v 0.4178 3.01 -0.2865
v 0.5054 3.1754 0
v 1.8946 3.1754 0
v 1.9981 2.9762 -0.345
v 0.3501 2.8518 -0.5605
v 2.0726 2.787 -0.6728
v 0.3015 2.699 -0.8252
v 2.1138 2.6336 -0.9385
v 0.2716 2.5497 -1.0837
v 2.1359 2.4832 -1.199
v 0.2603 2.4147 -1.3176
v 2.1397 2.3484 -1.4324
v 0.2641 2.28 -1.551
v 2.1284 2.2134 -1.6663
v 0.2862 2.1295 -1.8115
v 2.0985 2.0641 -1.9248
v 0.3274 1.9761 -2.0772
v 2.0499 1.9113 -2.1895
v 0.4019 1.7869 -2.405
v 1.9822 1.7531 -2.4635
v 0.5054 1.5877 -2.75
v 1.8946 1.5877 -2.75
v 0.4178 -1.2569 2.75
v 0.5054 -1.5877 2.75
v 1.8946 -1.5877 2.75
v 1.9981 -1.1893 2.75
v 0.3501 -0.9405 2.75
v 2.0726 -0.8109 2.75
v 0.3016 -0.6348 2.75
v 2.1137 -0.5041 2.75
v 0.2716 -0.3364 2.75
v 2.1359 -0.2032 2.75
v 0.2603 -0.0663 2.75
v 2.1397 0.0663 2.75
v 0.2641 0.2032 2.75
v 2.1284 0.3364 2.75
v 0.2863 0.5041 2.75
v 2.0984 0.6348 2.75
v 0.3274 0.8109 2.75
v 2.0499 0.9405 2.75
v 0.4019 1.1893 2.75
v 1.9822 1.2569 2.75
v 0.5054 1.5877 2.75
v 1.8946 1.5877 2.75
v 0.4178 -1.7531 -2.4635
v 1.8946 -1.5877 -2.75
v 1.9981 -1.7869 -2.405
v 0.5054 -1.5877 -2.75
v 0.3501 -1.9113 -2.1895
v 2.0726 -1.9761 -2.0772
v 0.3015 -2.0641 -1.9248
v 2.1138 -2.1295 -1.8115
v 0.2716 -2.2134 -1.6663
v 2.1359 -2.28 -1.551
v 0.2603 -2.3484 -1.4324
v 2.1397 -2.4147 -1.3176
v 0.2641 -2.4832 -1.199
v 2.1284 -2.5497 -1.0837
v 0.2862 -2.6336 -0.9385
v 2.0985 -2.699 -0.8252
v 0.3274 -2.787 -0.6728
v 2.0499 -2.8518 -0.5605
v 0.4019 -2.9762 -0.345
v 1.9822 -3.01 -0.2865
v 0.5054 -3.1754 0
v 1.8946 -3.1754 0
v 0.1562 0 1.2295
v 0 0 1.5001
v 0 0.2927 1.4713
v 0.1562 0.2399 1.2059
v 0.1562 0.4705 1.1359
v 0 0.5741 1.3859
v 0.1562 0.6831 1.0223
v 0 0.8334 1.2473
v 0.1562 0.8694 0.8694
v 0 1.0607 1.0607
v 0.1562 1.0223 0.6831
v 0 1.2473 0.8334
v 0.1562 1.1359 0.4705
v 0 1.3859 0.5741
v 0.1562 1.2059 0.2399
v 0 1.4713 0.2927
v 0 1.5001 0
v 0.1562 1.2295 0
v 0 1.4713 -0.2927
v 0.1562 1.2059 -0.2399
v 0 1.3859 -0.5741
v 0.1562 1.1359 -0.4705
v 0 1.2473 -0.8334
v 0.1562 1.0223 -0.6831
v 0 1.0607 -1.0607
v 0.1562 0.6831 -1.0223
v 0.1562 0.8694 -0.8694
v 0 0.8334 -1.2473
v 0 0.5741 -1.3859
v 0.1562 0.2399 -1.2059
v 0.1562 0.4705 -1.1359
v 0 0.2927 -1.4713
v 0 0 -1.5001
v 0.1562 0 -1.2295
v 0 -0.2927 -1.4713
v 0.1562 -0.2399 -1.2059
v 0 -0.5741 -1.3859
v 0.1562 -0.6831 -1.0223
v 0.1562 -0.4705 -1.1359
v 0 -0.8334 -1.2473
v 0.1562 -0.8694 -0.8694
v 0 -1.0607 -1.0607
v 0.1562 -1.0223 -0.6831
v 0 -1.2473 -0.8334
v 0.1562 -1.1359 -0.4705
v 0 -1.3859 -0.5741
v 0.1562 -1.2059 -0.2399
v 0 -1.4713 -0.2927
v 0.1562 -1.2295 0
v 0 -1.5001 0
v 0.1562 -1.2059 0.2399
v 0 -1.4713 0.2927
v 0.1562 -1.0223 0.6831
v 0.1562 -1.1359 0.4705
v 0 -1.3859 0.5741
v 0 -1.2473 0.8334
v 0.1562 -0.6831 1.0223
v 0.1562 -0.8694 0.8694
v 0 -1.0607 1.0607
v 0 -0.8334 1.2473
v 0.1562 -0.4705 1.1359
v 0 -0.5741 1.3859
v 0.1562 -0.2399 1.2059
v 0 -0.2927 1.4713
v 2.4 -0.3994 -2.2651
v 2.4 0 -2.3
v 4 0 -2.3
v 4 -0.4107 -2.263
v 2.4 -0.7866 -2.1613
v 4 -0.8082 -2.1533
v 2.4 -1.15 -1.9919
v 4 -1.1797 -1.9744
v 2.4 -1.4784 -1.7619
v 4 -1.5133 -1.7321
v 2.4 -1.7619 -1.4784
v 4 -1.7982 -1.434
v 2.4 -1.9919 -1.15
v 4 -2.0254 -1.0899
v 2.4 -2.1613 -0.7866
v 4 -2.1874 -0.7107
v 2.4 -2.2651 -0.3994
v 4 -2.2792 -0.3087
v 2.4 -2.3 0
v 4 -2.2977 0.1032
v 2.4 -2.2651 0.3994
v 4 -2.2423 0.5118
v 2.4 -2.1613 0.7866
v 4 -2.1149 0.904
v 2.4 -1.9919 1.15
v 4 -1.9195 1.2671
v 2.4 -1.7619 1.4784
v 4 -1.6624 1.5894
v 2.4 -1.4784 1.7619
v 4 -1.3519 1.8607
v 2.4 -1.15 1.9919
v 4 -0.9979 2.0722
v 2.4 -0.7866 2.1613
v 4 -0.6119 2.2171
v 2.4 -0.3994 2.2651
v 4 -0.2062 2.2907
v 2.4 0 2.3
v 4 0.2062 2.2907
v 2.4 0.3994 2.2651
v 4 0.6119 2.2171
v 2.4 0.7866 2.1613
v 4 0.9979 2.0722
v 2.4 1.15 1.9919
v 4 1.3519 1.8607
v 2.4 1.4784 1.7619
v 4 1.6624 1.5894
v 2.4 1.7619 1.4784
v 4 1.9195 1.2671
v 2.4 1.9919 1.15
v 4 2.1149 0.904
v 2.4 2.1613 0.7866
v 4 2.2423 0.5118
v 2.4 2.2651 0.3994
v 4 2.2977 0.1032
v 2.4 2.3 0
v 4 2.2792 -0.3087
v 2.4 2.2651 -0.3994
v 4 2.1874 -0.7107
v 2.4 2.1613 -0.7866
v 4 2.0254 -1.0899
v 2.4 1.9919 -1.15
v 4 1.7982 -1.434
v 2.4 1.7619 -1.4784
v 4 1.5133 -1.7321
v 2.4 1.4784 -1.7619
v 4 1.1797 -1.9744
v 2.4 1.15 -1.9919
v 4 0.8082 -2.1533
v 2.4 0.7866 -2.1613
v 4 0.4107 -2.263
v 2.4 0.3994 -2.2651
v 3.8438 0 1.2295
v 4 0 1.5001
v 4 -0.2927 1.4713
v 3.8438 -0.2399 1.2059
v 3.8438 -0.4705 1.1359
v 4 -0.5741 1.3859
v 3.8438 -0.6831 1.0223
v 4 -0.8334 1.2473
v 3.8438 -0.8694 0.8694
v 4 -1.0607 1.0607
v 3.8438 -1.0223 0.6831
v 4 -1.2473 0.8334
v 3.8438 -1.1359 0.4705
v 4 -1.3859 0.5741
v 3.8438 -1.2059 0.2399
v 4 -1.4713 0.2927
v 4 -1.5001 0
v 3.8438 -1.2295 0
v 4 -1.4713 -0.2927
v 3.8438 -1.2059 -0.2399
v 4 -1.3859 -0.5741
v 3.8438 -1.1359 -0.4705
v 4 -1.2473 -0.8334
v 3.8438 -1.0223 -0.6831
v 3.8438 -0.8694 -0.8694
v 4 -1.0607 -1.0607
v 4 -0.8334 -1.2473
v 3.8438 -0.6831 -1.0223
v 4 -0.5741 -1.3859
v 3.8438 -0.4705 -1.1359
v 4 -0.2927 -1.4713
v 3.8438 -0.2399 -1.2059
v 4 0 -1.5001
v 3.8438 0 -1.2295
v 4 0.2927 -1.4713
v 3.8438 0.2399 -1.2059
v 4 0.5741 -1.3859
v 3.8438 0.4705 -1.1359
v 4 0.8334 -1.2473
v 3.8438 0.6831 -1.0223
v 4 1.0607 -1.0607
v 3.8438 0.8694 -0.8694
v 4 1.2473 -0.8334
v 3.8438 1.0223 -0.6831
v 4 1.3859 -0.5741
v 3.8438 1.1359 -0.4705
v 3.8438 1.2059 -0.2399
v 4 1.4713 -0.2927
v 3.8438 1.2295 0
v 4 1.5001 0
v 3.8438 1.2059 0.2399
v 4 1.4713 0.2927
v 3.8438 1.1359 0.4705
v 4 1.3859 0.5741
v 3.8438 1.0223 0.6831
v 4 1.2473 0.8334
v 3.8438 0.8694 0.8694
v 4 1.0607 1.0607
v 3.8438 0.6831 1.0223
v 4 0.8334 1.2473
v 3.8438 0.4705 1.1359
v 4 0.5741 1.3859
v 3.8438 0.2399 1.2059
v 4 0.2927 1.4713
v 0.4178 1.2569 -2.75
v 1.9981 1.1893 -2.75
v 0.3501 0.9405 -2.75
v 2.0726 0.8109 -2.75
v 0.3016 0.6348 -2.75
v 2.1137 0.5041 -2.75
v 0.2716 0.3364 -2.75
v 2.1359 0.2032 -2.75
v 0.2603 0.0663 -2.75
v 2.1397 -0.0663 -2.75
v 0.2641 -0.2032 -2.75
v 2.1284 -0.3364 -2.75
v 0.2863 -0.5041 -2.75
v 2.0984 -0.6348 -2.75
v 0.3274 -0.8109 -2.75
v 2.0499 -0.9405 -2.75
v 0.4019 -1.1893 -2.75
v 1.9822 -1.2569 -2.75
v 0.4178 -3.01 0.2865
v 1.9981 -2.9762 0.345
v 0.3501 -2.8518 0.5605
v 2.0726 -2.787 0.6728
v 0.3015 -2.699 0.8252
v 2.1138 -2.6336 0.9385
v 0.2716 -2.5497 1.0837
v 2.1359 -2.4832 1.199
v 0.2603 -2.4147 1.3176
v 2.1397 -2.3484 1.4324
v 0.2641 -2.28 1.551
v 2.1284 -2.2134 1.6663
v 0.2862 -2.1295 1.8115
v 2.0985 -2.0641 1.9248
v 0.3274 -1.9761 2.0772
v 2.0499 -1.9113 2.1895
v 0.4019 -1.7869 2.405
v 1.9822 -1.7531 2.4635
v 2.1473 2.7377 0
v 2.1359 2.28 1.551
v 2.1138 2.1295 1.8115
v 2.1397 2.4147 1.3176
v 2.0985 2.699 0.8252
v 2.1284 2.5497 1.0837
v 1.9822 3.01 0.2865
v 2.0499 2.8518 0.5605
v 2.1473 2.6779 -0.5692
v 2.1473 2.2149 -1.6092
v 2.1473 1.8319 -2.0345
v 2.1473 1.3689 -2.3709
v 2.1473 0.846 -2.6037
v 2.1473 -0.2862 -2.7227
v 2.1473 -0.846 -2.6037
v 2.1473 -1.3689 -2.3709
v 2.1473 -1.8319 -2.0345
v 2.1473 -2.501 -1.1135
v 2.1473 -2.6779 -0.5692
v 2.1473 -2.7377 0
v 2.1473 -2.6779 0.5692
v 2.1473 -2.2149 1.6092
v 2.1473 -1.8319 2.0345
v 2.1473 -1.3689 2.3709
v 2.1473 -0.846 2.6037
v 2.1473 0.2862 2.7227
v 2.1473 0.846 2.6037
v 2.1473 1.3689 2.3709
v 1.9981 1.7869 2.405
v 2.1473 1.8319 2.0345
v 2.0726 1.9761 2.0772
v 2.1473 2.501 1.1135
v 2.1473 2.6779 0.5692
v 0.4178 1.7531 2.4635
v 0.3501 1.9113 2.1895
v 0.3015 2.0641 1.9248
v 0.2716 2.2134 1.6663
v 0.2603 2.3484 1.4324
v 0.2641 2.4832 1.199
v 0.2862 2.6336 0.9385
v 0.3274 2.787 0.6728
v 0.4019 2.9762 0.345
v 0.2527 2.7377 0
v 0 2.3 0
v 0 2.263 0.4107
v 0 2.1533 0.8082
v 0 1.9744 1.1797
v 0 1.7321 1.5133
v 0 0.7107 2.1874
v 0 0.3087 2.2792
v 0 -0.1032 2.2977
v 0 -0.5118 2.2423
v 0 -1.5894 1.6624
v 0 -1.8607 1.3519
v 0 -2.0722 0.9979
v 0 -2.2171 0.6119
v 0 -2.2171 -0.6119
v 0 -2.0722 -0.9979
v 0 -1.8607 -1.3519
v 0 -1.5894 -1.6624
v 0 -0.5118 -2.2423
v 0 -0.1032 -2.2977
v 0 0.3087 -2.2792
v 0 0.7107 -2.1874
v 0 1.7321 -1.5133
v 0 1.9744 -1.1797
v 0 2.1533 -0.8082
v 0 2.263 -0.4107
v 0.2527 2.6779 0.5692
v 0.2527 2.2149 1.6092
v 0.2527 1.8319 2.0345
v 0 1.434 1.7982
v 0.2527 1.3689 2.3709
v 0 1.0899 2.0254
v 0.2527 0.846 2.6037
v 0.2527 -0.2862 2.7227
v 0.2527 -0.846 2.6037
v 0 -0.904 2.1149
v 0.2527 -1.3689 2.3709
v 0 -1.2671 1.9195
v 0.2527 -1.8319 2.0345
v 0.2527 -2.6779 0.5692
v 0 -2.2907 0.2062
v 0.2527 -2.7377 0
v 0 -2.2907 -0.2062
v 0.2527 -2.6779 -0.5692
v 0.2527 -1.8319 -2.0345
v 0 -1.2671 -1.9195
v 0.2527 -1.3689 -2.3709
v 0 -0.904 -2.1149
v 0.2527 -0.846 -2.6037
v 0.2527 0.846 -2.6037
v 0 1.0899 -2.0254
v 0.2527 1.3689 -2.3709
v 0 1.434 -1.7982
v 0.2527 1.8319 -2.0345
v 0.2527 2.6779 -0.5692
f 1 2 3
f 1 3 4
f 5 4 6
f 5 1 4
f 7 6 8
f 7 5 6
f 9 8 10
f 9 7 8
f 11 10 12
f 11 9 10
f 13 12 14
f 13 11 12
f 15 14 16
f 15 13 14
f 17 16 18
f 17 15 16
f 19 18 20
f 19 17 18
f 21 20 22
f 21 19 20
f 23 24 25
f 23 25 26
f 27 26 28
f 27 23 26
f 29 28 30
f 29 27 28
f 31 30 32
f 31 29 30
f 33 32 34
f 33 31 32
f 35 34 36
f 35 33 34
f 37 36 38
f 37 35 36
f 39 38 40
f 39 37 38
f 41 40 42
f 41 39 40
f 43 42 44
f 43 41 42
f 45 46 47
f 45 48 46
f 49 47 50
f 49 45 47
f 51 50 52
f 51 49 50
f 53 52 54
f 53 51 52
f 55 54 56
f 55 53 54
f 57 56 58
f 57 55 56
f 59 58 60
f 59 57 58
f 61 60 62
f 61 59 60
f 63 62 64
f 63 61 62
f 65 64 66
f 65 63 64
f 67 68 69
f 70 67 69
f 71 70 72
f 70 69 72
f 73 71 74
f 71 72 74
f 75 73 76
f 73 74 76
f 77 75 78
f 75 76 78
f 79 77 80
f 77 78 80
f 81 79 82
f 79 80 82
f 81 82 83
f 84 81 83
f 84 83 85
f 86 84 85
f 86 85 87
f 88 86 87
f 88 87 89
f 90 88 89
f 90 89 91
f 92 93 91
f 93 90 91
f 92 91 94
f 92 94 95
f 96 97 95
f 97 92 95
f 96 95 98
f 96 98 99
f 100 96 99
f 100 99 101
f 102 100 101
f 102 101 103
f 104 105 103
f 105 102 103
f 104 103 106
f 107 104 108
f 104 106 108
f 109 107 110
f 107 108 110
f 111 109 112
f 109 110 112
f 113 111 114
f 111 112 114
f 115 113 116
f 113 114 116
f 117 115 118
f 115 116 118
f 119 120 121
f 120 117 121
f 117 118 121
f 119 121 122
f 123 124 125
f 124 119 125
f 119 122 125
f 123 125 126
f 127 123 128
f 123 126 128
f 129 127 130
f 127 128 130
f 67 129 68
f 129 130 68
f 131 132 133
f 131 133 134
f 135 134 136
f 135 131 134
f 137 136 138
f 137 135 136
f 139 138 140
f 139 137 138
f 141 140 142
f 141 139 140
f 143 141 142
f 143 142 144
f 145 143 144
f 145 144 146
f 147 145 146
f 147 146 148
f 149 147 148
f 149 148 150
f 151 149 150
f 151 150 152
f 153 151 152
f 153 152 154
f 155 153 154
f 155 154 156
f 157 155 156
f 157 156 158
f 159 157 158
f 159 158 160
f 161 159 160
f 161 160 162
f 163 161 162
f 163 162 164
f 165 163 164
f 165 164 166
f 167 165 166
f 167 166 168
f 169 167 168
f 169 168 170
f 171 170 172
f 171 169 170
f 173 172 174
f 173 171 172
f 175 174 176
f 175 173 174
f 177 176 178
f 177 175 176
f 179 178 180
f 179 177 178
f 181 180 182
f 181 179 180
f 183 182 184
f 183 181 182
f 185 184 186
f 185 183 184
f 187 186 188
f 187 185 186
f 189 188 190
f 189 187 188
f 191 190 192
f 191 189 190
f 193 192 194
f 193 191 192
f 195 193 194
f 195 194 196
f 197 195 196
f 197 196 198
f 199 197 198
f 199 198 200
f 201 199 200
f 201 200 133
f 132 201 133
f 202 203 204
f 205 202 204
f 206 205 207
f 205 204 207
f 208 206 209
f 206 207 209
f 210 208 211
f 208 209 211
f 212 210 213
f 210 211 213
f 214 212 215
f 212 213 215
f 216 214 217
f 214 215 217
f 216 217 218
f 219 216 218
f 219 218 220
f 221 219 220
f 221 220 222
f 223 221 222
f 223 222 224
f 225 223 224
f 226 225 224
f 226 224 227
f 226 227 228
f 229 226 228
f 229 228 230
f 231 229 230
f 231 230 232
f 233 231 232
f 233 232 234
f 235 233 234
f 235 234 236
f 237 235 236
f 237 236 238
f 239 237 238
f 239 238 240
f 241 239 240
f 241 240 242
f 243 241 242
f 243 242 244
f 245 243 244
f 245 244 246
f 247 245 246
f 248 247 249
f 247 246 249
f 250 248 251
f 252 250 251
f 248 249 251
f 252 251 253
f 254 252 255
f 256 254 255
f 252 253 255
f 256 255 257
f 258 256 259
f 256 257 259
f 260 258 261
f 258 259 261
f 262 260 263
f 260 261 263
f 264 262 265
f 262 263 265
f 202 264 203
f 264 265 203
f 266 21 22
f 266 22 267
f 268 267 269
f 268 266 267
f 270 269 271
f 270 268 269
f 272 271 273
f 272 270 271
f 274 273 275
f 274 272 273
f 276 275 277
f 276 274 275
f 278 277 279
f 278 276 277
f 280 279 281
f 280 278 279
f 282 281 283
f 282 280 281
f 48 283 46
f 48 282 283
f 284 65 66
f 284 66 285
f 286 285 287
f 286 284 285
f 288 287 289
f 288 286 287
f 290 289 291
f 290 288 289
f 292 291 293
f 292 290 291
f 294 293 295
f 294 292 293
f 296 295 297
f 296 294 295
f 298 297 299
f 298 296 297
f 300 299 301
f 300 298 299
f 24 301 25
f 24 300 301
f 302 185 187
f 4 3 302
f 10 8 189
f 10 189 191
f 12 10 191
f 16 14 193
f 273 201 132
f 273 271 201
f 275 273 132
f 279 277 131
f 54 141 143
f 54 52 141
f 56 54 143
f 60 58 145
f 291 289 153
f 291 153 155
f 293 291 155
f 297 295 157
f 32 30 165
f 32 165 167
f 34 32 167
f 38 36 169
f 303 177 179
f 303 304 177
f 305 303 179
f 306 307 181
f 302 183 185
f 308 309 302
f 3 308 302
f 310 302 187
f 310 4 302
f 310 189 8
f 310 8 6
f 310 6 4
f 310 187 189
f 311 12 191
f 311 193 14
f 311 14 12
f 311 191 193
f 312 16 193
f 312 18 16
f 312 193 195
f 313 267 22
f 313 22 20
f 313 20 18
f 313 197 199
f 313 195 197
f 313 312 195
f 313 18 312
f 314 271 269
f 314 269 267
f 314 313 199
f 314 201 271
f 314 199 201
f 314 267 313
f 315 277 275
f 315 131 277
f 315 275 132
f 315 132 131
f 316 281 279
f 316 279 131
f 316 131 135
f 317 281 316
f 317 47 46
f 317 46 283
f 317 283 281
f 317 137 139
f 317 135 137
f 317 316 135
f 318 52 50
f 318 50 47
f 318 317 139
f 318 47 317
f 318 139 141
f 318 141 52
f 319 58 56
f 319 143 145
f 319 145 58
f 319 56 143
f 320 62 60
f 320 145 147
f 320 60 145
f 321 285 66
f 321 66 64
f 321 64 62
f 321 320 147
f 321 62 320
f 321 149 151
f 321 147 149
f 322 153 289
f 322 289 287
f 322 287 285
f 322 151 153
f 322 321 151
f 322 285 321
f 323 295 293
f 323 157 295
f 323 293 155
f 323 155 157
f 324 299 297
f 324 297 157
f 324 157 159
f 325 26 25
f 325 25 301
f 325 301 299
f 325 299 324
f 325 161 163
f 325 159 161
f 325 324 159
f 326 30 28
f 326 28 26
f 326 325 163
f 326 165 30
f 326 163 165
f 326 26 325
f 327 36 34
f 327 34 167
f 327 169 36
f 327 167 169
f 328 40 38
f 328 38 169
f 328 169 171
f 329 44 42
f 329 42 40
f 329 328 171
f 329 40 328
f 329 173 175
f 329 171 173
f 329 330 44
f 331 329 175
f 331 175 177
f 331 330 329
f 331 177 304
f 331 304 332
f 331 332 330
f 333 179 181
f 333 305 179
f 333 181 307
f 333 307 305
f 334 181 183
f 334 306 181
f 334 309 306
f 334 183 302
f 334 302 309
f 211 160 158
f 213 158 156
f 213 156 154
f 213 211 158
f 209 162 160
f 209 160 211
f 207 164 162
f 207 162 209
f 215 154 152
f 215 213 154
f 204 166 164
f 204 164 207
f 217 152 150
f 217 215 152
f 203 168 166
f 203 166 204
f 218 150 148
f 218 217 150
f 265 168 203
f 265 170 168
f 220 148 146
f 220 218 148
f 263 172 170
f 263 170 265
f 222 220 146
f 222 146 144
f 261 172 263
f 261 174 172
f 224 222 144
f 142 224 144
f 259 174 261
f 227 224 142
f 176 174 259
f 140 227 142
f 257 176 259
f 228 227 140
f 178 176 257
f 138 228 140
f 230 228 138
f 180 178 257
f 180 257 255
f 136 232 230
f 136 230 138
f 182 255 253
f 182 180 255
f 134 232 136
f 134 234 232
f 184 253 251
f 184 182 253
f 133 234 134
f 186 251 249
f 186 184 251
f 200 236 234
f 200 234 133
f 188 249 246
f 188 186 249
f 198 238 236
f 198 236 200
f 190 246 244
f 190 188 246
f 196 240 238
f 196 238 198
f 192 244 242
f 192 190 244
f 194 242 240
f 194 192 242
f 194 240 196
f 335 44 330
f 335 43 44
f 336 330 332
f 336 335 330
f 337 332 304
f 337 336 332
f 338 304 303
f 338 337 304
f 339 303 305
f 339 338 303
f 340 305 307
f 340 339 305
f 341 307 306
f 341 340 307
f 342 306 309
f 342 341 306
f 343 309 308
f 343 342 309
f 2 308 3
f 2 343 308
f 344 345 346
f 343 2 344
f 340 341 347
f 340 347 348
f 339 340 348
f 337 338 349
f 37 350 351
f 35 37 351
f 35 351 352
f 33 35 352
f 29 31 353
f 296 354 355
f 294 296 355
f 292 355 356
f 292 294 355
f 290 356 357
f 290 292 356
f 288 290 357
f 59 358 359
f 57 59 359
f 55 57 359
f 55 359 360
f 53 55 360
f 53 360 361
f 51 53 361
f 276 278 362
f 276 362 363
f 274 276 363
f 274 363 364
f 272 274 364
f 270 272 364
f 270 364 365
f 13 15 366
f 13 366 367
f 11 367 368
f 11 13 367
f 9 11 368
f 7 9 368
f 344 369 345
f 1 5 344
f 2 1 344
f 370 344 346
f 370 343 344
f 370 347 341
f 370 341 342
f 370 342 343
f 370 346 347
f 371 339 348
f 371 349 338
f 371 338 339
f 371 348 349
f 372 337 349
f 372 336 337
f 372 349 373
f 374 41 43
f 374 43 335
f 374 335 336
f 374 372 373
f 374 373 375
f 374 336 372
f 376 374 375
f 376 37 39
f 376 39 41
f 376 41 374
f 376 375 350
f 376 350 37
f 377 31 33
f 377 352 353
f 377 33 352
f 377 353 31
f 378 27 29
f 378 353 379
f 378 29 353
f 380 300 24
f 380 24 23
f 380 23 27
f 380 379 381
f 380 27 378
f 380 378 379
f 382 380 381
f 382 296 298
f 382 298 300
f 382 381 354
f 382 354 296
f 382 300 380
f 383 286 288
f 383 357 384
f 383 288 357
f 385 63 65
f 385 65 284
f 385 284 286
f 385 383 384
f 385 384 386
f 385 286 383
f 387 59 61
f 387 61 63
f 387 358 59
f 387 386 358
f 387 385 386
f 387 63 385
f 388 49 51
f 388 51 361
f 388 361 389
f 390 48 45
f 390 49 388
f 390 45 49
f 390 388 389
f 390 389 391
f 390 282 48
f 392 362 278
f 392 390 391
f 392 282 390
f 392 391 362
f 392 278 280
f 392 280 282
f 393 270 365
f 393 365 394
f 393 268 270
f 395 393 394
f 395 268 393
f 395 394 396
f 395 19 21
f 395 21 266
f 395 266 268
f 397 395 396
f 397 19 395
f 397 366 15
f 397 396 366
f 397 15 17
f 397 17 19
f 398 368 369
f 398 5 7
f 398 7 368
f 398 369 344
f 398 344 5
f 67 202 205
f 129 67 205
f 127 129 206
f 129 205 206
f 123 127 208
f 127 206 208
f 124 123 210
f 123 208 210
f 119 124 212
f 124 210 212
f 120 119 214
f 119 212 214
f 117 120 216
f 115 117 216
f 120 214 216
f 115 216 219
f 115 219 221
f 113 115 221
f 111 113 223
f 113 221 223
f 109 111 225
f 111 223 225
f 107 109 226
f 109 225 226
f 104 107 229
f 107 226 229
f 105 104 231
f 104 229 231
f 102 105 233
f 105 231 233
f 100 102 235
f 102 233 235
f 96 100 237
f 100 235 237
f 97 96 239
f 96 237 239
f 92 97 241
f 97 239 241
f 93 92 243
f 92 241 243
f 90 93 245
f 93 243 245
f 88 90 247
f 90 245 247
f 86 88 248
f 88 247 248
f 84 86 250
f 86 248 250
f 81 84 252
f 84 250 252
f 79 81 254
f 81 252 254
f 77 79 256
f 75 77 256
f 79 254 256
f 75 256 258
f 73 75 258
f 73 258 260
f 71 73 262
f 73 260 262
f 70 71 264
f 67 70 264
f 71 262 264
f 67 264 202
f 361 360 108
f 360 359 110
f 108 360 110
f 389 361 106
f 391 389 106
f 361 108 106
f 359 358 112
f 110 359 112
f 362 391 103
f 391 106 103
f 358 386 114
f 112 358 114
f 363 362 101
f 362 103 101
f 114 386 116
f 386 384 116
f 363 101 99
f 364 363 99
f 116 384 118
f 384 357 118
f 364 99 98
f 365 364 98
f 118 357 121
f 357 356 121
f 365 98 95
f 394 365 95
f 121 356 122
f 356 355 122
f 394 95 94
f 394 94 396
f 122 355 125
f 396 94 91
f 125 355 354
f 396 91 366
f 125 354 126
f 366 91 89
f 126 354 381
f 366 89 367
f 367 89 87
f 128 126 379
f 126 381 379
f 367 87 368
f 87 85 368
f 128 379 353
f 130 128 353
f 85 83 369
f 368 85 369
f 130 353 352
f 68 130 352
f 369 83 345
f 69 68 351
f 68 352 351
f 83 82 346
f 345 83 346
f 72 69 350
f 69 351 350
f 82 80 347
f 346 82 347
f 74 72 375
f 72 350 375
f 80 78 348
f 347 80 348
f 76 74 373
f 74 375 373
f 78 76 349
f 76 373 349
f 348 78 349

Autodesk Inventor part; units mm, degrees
ref_plane "YZ Plane" through (0, 0, 0) normal (1, 0, 0) x (0, 1, 0)
ref_plane "XZ Plane" through (0, 0, 0) normal (0, 1, 0) x (-1, 0, 0)
sketch "Sketch1" plane through (0, 0, 0) normal (1, 0, 0) x (0, 1, 0)
  line L0 (1.5877, -2.75) -> (-1.5877, -2.75)
  line L1 (-1.5877, -2.75) -> (-3.1754, 0)
  line L2 (-3.1754, 0) -> (-1.5877, 2.75)
  line L3 (-1.5877, 2.75) -> (1.5877, 2.75)
  line L4 (1.5877, 2.75) -> (3.1754, 0)
  line L5 (3.1754, 0) -> (1.5877, -2.75)
  point P0 (0, 0)
  point P1 (0, 0)
  dimension "d0" = 6.3509
extrude "Body" add sketch "Sketch1" along normal blind 2.4
sketch "Sketch2" plane through (2.4, 0, 0) normal (1, 0, 0) x (0, 0, -1)
  circle A0 centre (0, 0) radius 2.3
  dimension "d7" = 4.6
extrude "Ring" add sketch "Sketch2" along normal blind 1.6
sketch "Sketch3" plane through (0, 0, 0) normal (0, 0, 1) x (1, 0, 0)
  line L0 (0, 1.5877) -> (0, 3.1754) projected
  line L1 (0, 3.1754) -> (2.4, 3.1754) projected
  line L2 (2.4, 1.5877) -> (2.4, 3.1754) projected
  line L3 (-0.48, 0) -> (2.88, 0) projected
  line L4 (0, 2.3) -> (0.5054, 3.1754)
  line L5 (1.8946, 3.1754) -> (2.4, 2.3)
  dimension "d3" = 30
  dimension "d4" = 30
  dimension "d5" = 4.6
  dimension "d6" = 4.6
revolve "Chamfer1" cut sketch "Sketch3" angle 360 about axis through (-10, 0, 0) along (1, 0, 0)
sketch "Sketch4" plane through (0, 0, 0) normal (-1, 0, 0) x (0, 0, 1)
  line L0 (0, -4.4456) -> (0, 4.4456) projected
  line L1 (-3.85, 0) -> (3.85, 0) projected
  point P0 (0, 0)
hole "Thread" at (0, 0, 0) direction (1, 0, 0) diameter 2.459 end through all thread size "M3x0.5" class "6H" standard "ISO Metric profile"
chamfer "Chamfer2" distance 0.2706 angle 30 1 edges at (0, 0, -1.2295) measured on face at (0, 1.9179, -0.2329)
chamfer "Chamfer3" distance 0.2706 angle 30 1 edges at (4, 0, -1.2295) measured on face at (4, -0.2816, -1.909)
ref_plane "Work Plane1" through (9.305, 0, 0) normal (0, 0, 1) x (-1, 0, 0)
equation "\"d0\" = 1.1547 * SW"
equation "\"d1\" = KOH1"
equation "\"d7\" = SD2"
equation "\"d8\" = KOH - KOH1"
equation "\"d3\" = ANG1"
equation "\"d4\" = ANG2"
equation "\"d5\" = SW0"
equation "\"d6\" = SW01"
equation "\"d10\" = -0.5 * GD1 + 0.5 * NND"
equation "\"d46\" = -0.5 * GD1 + 0.5 * NND"
equation "\"d12\" = -0.5 * GD1 + 0.5 * NND"
equation "\"d47\" = -0.5 * GD1 + 0.5 * NND"
equation "\"ANG1\" = 30deg"
equation "\"ANG2\" = 30deg"
equation "\"NND\" = 3"
equation "\"KOH1\" = 2.4"
equation "\"KOH\" = 4"
equation "\"SW\" = 5.5"
equation "\"SW0\" = 4.6"
equation "\"SW01\" = SW0"
equation "\"SD2\" = SW0"
equation "\"GUL\" = 0.541266 * PTC"
equation "\"THREADDIA\" = 3"
equation "\"TOA\" = 30deg"
equation "\"PTC\" = 0.5"
equation "\"GAL\" = 0.541266 * PTC"
equation "\"E0\" = 1.155 * SW"
equation "\"GD1\" = 2.458734"
properties part number "DIN 985 - M3" material "Steel, Mild"
